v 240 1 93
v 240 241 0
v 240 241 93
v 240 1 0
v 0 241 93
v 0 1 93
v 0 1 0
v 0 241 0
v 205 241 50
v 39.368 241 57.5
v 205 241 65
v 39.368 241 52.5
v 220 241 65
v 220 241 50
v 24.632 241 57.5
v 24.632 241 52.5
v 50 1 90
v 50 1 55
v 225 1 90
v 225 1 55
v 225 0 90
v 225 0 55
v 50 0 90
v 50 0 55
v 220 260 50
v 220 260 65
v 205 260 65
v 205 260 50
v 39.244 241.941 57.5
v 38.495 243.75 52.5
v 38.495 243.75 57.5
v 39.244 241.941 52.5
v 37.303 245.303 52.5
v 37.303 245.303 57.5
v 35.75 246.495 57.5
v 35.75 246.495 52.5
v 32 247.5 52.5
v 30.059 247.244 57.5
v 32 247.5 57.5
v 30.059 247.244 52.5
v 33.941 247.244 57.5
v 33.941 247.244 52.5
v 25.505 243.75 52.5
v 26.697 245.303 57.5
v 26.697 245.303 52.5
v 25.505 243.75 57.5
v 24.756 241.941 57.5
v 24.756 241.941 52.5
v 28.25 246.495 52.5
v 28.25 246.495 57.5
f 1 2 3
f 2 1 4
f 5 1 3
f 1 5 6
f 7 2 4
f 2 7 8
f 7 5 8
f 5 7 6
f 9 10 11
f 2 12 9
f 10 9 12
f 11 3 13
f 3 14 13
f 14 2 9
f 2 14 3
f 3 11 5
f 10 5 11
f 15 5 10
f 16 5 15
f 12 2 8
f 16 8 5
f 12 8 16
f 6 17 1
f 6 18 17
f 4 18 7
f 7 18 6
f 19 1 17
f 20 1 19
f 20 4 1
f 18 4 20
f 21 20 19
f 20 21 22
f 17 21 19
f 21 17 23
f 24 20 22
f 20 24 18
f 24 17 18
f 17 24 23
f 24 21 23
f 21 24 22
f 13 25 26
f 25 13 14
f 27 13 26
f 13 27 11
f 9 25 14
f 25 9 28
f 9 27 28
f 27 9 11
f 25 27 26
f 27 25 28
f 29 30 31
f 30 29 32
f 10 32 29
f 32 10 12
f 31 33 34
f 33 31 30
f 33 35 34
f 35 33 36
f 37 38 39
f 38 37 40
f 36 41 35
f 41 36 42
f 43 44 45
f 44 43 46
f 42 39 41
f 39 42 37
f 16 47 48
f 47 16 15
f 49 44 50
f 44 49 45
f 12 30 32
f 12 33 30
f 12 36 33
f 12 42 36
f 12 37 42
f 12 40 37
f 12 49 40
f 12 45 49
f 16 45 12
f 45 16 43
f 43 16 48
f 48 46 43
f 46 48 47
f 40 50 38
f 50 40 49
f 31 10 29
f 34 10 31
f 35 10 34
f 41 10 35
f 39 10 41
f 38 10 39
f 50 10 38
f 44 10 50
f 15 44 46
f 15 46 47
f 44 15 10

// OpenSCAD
//TODO
module KWTuner() {
translate([0,1,0]) color([0.1,0.1,0.1]) cube([240,240,93]);
    
translate ([50,0,55]) color([0.2,0.0,0.8]) cube([175,1,35]);
    
translate ([205,240,50]) color([0.7,0.7,0.7]) cube([15,20,15]);
    
translate([32,240,55]) color([0.7,0.7,0.7]) cylinder(5,d=15,center=true);
}

KWTuner();
